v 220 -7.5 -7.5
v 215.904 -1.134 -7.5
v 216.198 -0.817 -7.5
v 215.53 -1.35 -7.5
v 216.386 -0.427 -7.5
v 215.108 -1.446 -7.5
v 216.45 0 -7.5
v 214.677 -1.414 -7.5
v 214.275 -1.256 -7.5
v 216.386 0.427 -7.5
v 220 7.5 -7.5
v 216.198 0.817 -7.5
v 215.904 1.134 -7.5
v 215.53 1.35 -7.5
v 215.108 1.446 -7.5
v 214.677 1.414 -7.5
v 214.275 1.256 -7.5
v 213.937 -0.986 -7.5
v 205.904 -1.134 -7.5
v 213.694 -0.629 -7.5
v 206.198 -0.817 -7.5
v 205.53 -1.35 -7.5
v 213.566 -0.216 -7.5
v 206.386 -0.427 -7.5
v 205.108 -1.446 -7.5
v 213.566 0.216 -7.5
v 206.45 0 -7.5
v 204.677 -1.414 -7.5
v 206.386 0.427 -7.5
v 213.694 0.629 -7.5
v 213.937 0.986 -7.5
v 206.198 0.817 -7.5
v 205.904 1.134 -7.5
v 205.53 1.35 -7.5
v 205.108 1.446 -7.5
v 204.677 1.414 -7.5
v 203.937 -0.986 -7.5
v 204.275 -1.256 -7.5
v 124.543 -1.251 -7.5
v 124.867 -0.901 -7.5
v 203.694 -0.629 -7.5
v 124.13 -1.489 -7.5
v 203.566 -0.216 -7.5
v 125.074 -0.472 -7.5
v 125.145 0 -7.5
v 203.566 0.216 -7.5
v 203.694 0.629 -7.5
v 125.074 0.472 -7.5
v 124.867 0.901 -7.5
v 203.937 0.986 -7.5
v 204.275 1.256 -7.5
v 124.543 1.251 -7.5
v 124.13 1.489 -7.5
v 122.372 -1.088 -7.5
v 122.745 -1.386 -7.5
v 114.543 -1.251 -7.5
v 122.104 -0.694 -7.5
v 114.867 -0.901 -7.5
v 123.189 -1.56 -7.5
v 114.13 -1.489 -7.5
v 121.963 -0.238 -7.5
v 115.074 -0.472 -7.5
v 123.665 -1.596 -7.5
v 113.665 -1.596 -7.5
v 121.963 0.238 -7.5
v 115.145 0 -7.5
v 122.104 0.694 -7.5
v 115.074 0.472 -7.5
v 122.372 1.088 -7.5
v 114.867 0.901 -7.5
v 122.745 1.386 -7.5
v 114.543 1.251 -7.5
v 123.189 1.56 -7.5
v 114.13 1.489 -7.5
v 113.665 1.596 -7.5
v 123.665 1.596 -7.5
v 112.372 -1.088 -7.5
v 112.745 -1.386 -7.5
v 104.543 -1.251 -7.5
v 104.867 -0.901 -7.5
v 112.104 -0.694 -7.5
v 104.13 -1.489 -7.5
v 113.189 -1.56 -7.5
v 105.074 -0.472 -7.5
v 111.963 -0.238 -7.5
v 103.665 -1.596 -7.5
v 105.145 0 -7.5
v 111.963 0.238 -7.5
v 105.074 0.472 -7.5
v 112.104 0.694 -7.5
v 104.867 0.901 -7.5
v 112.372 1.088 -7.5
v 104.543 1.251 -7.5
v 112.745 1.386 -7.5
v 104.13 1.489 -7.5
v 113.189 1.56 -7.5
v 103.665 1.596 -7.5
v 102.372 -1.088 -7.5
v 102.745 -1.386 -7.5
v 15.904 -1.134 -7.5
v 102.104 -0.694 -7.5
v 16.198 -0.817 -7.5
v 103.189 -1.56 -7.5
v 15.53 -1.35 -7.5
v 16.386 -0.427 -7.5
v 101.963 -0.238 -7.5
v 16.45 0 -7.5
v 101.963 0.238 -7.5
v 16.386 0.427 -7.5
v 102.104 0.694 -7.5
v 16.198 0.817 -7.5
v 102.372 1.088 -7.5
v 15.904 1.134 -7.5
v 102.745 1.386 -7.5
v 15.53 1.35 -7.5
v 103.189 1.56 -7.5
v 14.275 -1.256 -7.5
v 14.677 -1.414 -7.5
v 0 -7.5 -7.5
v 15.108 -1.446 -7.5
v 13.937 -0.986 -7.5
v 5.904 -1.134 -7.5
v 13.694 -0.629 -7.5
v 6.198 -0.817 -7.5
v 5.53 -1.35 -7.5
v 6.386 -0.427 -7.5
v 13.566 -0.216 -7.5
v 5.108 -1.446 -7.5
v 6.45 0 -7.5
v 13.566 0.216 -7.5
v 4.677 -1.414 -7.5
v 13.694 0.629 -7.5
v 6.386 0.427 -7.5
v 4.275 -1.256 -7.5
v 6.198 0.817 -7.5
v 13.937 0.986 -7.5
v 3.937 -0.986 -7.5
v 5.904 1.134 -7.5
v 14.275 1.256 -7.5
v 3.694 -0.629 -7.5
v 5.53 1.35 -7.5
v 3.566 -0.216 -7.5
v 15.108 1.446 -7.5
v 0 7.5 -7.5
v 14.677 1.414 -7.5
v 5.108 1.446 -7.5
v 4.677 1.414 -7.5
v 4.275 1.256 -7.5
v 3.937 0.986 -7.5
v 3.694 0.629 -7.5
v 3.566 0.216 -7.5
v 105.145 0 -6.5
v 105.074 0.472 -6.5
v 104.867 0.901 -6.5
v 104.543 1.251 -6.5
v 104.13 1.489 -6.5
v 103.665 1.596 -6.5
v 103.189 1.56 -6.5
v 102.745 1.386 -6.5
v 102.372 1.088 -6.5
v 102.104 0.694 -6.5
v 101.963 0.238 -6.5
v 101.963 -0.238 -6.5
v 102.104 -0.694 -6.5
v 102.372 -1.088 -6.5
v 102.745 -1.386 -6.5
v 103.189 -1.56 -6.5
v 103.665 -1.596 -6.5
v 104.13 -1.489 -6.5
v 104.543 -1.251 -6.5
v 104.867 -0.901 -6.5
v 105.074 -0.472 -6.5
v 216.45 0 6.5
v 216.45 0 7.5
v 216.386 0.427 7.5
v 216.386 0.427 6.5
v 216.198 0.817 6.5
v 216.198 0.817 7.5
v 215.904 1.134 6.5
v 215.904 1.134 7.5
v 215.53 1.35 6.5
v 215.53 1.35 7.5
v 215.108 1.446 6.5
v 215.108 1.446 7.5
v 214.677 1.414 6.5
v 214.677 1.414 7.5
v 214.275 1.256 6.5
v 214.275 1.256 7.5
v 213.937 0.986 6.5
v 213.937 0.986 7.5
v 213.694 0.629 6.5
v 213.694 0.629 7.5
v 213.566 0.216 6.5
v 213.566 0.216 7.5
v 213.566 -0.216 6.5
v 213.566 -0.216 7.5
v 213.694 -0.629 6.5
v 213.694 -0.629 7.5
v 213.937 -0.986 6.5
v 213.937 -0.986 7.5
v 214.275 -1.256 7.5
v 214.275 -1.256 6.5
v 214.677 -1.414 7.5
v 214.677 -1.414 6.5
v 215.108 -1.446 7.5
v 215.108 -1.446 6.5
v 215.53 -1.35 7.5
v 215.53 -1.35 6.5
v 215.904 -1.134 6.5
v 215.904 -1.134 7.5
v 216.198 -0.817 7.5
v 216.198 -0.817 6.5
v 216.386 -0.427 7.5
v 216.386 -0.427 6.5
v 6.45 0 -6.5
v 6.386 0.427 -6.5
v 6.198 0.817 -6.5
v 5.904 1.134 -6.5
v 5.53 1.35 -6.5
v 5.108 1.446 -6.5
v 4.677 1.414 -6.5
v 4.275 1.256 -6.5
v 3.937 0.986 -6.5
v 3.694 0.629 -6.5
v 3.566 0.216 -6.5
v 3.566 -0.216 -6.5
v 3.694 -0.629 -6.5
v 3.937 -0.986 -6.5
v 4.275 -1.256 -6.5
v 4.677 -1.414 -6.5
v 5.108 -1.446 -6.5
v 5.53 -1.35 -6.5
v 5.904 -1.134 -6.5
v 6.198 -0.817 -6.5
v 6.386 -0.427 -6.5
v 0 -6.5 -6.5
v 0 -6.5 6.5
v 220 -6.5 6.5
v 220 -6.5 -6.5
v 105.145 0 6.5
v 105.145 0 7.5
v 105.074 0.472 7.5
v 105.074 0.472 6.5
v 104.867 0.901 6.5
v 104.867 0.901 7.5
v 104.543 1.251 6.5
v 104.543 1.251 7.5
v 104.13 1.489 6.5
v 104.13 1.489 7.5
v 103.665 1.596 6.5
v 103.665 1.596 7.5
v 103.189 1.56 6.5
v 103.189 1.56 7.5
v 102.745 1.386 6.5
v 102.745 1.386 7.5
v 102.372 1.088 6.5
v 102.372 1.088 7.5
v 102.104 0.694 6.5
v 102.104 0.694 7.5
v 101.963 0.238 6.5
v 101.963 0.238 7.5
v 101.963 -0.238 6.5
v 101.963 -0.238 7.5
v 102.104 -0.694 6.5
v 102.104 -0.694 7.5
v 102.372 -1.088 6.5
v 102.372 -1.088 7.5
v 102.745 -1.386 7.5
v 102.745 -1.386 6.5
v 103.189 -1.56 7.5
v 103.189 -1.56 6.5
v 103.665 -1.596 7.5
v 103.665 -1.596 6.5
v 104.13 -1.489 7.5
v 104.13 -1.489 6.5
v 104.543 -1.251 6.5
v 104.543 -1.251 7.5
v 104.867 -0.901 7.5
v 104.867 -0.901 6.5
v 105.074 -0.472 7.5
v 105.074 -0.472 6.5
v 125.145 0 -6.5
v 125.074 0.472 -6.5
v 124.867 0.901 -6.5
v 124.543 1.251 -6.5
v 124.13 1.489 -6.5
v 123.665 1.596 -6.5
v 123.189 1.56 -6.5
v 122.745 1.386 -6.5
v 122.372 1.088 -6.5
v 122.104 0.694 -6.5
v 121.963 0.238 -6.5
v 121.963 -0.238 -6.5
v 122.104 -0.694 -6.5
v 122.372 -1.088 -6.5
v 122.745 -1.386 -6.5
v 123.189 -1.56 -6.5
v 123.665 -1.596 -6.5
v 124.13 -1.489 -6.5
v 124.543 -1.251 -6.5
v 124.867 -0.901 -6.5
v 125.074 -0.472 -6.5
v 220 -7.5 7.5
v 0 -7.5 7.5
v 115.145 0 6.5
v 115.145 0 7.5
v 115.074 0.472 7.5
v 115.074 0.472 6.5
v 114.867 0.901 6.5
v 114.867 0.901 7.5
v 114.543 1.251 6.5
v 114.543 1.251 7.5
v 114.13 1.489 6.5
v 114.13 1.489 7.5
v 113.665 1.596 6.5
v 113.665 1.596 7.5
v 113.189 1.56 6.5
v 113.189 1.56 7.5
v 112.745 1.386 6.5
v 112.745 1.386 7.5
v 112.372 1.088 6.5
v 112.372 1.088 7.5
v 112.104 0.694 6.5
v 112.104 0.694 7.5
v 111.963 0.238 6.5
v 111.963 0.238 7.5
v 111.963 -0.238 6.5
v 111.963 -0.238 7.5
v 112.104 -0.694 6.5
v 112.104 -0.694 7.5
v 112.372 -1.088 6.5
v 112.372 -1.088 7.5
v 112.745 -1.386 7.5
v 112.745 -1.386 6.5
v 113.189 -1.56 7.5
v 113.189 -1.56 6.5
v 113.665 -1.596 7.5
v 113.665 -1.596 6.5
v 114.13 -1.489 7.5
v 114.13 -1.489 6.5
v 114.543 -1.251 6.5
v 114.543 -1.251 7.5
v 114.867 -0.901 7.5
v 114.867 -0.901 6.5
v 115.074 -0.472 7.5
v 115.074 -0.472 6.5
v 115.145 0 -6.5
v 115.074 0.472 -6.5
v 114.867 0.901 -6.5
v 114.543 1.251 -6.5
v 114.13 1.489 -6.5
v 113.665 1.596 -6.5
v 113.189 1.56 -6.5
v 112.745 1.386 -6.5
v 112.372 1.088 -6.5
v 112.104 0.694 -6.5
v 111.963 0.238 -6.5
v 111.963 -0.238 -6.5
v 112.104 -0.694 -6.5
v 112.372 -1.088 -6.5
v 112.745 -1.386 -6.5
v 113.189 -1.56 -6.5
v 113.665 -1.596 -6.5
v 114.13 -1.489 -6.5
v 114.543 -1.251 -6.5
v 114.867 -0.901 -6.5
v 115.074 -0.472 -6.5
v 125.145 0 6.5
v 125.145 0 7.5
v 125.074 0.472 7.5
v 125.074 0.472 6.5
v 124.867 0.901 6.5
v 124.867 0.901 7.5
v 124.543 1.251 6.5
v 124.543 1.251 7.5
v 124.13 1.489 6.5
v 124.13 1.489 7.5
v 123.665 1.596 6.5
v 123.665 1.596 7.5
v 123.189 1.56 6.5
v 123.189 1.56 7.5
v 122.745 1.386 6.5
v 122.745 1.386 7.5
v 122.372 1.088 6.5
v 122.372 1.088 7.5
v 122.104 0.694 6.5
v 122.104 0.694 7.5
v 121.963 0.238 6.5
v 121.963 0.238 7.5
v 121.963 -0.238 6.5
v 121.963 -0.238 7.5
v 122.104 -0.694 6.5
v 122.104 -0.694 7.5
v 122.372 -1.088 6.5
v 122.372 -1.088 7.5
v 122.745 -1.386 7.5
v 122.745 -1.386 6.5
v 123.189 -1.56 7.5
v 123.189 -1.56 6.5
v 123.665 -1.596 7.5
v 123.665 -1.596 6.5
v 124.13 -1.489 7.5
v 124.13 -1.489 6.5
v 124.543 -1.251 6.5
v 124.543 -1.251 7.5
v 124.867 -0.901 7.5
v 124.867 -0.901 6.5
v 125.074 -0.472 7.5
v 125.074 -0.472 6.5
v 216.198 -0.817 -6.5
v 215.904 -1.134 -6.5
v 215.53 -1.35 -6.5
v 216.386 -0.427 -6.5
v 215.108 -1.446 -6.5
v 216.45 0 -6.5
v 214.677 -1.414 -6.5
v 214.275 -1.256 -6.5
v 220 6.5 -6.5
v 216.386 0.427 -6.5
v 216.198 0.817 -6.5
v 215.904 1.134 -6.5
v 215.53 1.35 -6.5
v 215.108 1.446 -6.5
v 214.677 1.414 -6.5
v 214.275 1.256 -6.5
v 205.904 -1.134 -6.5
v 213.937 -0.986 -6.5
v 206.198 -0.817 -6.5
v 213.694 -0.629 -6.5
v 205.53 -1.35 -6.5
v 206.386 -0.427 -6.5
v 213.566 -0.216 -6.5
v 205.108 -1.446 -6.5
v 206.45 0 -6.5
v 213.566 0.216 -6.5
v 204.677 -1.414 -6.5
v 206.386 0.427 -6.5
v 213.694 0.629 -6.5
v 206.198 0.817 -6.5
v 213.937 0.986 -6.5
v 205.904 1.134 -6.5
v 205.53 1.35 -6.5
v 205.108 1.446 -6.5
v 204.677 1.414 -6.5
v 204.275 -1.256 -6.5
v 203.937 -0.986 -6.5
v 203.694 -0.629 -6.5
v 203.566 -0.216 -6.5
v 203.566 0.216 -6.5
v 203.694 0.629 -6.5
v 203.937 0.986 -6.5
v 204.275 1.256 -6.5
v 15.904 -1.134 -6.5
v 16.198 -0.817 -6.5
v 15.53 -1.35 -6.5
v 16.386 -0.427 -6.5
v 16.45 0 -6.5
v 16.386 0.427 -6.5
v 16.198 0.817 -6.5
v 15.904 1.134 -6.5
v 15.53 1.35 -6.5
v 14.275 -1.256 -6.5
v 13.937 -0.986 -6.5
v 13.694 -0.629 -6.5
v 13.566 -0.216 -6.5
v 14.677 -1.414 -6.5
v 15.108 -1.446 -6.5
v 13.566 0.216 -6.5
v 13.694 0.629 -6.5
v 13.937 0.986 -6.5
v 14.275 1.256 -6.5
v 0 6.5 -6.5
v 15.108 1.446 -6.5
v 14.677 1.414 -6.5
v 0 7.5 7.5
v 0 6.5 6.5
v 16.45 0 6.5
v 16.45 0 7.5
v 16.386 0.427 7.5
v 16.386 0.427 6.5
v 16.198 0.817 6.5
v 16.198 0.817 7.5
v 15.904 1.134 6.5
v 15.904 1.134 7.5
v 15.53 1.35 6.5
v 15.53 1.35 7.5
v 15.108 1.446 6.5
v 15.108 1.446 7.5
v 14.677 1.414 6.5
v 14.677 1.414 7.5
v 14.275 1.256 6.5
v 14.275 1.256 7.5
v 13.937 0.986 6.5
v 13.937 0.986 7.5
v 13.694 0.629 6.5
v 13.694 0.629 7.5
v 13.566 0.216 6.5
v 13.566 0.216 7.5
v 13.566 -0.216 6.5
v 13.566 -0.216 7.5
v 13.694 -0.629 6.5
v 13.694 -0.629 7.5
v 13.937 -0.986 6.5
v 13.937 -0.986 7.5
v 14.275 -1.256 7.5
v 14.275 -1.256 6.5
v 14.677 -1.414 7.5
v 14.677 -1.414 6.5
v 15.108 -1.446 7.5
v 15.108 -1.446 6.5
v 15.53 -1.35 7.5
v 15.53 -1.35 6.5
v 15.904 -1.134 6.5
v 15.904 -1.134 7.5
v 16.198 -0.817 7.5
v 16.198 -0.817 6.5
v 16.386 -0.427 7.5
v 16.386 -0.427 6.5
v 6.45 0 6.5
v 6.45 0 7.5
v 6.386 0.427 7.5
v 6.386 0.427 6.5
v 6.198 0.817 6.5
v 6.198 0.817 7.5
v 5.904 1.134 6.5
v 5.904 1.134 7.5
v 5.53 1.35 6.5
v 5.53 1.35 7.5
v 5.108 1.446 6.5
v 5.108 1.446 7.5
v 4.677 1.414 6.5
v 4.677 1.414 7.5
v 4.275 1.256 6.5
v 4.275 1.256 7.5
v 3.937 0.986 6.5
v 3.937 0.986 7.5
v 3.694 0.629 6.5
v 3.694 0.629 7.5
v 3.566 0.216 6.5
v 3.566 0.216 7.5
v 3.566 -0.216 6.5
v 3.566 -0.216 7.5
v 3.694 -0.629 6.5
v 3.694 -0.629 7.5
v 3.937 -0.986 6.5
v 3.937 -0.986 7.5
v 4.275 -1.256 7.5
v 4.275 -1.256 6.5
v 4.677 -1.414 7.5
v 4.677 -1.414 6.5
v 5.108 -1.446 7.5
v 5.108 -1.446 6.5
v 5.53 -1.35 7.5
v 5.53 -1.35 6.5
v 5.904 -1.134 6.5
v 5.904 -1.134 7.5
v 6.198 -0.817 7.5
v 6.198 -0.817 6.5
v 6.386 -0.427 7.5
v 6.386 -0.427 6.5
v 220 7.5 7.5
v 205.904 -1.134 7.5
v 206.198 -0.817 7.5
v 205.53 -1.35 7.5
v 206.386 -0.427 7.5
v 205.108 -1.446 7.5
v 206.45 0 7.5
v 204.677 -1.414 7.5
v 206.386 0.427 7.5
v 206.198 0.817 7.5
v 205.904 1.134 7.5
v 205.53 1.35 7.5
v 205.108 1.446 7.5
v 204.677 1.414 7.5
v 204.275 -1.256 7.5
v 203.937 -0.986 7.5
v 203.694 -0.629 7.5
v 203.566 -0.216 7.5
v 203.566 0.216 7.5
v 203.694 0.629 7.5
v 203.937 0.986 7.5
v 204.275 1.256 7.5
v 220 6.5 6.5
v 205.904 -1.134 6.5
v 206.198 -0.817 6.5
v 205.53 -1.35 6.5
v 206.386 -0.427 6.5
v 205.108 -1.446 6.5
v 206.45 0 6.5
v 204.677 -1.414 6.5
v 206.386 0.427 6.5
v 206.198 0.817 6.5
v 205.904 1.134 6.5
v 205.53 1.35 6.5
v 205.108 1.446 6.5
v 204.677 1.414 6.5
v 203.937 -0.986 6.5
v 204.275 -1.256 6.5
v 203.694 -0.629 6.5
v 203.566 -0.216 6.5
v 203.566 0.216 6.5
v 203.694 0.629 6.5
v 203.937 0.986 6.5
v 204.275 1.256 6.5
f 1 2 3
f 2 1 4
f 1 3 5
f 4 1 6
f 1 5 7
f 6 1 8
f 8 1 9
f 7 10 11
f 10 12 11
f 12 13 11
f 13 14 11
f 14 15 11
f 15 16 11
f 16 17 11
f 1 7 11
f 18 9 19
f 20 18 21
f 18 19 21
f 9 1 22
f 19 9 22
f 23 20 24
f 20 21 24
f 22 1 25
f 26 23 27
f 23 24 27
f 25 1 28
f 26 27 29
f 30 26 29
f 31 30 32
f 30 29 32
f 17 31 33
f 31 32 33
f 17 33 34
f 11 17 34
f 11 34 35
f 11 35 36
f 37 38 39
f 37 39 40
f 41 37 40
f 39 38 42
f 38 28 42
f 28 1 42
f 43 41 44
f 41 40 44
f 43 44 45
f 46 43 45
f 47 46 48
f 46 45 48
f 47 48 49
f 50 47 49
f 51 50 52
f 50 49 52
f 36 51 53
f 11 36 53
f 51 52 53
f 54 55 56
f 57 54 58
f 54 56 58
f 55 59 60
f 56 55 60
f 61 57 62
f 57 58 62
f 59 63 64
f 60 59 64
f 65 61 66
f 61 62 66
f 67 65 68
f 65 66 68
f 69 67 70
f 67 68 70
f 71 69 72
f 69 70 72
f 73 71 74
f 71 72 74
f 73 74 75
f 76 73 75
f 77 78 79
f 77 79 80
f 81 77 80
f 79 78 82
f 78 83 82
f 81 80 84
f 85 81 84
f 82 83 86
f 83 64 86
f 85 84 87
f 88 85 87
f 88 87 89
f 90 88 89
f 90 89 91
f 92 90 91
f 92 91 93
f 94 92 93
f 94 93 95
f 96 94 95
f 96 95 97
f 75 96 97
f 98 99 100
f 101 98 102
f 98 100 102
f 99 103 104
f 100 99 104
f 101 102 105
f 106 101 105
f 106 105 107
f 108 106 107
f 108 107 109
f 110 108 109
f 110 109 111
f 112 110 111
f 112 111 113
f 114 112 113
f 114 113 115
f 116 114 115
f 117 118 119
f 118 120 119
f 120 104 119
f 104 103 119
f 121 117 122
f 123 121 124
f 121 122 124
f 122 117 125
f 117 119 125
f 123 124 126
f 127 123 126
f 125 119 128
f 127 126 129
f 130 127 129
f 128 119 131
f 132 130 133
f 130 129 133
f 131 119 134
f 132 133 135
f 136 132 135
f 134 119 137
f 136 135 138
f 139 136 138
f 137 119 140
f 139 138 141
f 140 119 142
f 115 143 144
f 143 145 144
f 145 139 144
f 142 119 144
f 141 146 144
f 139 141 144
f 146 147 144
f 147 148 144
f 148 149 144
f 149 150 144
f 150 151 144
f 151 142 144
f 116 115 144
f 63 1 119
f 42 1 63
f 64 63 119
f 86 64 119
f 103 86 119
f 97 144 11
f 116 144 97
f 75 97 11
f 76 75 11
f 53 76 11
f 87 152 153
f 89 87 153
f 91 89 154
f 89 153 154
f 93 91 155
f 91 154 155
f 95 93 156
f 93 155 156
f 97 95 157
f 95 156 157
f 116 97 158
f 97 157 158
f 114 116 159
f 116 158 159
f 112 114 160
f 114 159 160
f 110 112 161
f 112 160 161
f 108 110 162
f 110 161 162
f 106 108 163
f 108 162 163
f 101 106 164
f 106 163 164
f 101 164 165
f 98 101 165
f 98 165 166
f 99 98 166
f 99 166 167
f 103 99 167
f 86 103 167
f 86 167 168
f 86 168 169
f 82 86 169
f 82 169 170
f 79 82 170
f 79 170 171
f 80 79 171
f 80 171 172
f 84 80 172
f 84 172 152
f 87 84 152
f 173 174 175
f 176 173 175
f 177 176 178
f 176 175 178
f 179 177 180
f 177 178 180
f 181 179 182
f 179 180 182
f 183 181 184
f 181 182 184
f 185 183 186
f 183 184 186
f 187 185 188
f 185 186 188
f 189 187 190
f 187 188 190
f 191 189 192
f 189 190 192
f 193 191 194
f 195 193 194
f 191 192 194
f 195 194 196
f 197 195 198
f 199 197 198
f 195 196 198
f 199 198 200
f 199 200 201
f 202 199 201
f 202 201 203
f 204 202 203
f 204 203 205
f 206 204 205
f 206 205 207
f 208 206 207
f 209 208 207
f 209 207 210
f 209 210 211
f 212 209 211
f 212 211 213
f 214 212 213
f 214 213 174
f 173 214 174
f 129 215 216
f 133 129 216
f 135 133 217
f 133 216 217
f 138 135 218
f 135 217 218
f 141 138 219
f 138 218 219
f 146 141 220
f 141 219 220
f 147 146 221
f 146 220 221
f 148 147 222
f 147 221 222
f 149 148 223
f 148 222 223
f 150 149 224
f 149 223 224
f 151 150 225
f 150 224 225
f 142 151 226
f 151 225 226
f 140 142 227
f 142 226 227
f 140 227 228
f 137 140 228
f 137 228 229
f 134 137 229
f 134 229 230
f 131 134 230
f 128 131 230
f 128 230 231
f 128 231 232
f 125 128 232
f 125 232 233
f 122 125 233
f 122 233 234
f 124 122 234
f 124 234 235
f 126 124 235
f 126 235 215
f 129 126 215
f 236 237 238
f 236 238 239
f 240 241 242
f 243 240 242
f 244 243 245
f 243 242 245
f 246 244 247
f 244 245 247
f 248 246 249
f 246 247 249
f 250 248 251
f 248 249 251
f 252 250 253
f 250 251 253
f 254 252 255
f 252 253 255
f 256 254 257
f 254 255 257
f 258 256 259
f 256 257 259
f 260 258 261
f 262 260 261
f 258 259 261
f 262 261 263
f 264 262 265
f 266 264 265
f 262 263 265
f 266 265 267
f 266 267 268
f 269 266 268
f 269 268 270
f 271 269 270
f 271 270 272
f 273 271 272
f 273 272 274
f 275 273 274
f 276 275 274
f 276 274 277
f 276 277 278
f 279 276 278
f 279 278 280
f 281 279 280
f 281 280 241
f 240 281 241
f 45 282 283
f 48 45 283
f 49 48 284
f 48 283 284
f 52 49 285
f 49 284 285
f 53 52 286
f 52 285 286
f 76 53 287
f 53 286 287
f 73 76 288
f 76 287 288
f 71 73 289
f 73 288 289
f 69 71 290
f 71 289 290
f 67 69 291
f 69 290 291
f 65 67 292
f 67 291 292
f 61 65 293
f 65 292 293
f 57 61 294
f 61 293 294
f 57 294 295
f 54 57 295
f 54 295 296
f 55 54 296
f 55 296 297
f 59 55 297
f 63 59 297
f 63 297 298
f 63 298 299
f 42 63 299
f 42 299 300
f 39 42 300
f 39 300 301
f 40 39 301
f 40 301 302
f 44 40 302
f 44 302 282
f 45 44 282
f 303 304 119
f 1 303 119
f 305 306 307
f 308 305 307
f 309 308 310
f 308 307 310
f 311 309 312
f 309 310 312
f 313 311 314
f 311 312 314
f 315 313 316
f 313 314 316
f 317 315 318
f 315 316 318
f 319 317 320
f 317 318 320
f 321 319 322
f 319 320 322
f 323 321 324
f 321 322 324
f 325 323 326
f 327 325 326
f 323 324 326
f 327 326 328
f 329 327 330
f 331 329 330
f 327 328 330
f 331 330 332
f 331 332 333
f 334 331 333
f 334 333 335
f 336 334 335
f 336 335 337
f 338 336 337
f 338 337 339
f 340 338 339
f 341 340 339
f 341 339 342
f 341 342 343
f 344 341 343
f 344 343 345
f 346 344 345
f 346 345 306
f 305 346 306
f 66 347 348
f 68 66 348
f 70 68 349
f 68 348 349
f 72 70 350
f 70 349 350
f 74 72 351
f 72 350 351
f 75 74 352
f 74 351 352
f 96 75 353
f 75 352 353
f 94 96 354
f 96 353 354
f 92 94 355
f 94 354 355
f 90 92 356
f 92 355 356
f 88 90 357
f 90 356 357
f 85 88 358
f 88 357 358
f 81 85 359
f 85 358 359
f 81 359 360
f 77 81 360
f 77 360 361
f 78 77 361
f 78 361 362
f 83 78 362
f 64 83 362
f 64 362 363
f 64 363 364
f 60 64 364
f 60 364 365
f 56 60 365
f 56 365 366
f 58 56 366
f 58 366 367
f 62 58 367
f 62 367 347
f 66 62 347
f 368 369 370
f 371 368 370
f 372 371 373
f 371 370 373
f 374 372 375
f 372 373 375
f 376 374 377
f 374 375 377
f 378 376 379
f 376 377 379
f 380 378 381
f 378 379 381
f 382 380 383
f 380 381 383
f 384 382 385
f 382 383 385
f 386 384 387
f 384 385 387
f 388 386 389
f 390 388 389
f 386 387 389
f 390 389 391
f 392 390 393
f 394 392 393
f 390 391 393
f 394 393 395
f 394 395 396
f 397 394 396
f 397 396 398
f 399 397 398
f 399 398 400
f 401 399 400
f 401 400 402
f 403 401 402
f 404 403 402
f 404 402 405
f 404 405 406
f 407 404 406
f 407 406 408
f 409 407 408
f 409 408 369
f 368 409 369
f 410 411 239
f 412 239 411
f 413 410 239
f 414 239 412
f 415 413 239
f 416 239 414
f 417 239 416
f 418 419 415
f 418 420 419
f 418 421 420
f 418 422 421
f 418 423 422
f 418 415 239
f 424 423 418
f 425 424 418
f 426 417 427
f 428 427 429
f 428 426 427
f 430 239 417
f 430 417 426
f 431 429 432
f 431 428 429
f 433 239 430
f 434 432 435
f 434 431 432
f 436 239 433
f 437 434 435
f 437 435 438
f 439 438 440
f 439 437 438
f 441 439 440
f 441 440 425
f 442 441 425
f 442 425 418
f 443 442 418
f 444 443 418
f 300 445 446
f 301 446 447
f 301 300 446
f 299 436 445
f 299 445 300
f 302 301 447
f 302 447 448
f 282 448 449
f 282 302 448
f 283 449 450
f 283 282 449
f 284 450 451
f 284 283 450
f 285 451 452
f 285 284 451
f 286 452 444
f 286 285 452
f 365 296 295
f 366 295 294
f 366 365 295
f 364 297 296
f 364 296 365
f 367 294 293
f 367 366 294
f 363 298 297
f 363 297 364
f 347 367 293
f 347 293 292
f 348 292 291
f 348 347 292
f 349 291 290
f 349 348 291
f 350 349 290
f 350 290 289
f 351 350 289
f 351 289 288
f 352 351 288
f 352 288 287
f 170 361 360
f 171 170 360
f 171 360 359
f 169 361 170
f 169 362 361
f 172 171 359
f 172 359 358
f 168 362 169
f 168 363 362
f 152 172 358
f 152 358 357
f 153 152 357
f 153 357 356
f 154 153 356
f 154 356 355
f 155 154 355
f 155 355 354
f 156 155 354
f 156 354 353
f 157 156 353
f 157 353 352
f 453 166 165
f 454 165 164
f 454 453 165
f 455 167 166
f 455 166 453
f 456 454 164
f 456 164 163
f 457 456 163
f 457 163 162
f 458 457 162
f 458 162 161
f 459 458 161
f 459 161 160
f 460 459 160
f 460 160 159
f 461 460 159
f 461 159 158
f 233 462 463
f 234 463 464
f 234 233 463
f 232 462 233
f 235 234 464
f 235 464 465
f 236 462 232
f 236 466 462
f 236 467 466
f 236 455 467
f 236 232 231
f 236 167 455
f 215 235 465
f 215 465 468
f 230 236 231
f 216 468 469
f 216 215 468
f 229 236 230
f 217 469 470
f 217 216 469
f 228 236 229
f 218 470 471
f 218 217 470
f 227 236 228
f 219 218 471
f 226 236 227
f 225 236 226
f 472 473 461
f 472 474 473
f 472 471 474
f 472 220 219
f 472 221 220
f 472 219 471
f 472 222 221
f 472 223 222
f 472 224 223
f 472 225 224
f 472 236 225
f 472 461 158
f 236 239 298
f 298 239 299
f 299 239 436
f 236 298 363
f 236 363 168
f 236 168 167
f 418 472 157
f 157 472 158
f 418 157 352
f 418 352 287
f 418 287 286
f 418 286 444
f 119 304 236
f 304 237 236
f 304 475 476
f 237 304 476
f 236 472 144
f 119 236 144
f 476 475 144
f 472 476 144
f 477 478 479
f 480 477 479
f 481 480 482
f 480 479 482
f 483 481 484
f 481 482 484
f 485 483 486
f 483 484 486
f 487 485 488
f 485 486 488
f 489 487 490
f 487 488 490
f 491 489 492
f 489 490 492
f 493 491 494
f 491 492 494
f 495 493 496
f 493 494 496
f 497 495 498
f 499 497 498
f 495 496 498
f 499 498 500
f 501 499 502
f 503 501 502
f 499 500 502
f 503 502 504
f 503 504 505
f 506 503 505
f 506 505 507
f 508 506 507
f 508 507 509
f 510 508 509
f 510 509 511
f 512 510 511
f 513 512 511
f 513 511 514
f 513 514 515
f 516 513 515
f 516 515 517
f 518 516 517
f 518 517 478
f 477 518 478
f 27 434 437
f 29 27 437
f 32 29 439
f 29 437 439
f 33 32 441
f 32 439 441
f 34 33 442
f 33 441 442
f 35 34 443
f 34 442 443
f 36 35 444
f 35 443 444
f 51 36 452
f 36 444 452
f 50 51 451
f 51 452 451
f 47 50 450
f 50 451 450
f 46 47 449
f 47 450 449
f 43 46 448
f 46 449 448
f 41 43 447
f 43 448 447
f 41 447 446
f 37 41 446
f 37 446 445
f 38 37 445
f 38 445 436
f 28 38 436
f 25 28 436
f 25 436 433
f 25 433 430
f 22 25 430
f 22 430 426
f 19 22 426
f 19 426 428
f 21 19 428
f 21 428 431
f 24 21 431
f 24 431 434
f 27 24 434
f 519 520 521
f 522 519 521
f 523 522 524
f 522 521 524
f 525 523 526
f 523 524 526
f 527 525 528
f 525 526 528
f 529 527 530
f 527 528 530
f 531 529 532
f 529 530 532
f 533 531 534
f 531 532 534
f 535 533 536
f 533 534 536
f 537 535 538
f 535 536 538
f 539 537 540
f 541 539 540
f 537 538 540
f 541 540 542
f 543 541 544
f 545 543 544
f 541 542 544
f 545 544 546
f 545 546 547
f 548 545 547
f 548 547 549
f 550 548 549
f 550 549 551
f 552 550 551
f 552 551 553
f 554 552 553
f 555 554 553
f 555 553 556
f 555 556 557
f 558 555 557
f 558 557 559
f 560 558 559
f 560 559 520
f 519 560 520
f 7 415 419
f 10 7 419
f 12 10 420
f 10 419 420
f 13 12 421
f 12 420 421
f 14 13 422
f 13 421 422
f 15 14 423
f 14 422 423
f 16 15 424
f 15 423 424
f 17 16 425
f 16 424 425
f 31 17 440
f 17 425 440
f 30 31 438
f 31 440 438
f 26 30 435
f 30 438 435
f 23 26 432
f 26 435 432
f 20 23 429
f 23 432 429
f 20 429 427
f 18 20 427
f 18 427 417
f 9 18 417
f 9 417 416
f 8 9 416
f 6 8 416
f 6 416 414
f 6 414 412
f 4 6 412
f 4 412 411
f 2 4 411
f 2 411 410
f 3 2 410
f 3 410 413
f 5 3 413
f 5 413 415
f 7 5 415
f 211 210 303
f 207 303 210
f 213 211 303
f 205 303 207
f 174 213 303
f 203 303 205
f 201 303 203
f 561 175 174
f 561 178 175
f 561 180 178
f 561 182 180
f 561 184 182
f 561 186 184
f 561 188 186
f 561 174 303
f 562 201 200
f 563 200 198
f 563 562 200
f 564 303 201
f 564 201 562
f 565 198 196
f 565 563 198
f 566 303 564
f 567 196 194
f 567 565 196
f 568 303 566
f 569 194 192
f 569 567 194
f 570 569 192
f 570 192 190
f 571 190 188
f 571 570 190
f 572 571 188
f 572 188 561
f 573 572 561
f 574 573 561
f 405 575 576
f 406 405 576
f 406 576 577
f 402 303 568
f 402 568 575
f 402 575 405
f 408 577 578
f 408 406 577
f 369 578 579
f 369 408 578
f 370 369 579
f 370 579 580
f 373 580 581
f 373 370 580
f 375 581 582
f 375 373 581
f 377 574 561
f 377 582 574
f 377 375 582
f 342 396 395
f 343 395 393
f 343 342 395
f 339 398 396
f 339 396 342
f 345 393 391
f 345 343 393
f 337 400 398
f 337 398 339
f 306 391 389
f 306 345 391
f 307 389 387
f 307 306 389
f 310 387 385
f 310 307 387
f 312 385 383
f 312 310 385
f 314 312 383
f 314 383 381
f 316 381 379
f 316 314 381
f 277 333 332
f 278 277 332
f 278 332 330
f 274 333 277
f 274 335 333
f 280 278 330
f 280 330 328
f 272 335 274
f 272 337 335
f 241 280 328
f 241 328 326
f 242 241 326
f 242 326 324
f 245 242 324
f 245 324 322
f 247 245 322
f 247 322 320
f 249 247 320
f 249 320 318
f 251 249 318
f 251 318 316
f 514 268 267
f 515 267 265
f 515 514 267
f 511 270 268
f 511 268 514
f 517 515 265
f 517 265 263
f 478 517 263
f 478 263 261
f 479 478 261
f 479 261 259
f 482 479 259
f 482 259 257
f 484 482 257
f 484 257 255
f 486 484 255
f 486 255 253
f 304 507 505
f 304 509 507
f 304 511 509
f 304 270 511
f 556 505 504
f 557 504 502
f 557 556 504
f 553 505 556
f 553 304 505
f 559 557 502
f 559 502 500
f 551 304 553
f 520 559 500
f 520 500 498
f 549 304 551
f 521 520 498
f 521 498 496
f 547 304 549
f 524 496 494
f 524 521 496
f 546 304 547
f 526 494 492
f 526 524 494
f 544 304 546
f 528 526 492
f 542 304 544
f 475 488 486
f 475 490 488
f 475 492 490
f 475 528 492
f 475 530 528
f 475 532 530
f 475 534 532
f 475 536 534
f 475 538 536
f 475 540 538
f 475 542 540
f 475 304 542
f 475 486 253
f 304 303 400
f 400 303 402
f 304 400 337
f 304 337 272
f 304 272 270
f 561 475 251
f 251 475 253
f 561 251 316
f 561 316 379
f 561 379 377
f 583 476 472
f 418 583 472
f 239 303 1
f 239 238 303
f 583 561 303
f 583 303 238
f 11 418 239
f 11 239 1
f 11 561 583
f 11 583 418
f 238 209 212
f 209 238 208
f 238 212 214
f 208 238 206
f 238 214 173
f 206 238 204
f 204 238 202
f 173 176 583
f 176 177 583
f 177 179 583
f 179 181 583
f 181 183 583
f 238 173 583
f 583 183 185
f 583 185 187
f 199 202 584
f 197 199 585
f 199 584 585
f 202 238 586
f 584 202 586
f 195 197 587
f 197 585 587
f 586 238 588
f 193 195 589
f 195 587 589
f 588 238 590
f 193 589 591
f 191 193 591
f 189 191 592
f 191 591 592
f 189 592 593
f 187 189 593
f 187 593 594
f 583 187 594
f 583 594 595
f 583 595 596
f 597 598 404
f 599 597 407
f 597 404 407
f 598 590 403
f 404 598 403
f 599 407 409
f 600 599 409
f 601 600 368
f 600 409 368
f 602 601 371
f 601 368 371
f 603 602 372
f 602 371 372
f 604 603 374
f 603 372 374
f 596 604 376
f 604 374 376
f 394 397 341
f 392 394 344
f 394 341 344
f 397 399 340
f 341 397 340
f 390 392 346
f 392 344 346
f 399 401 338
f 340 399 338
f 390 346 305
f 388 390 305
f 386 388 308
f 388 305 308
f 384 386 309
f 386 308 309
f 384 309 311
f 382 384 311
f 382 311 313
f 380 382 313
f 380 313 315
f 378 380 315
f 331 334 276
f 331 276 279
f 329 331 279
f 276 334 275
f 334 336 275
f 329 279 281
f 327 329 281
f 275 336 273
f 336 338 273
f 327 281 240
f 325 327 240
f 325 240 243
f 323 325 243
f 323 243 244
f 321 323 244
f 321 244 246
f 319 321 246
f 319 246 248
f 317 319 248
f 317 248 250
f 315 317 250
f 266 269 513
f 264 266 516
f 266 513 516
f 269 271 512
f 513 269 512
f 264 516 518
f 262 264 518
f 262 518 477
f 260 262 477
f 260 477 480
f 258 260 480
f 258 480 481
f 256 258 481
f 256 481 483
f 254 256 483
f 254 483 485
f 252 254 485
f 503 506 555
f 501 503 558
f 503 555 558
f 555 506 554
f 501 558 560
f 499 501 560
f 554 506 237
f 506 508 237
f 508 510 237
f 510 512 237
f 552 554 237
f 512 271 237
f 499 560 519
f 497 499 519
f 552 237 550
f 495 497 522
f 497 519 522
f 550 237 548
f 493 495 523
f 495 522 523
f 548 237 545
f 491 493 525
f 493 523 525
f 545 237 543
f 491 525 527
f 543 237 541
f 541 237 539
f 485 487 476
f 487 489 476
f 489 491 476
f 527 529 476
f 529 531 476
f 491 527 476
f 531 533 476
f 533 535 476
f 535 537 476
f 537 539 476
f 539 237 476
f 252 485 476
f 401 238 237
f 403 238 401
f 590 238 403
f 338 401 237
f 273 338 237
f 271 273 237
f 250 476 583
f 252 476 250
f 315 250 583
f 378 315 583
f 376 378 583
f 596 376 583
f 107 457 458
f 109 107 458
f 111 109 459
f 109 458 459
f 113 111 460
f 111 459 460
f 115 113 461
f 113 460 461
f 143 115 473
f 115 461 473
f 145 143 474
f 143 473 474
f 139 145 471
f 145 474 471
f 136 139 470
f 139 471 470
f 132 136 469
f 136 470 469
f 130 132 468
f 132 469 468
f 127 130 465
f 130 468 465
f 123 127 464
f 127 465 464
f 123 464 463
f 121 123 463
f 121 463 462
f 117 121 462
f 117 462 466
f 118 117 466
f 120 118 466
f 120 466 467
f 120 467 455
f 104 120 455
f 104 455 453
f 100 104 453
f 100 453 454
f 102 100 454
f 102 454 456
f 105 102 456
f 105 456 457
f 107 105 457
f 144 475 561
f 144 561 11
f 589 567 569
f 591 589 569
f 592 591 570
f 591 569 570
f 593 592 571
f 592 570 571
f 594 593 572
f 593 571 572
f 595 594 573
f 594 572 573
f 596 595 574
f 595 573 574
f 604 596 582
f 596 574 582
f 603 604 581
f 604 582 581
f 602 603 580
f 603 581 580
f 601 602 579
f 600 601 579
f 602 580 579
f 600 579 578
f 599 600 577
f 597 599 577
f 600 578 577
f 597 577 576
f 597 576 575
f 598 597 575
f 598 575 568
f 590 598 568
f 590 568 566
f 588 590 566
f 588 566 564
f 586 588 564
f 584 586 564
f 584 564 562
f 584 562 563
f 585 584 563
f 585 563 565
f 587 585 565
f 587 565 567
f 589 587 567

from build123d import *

# Parameters (mm, degrees)
SKETCH_1_W          = 15
SKETCH_1_H          = 15
SKETCH_1_W_2        = 13
SKETCH_1_H_2        = 13
EXTRUDE_1_DEPTH     = 220
SKETCH_2_R          = 1.45
SKETCH_2_R_2        = 1.6
CUT_EXTRUDE_1_DEPTH = 221.638278637


with BuildPart() as part:
    # 草图1 → 凸台-拉伸1 (new body)
    with BuildSketch(Plane(origin=(0, 0, 0), x_dir=(0, 0, -1), z_dir=(1, 0, 0))):
        Rectangle(SKETCH_1_W, SKETCH_1_H)
        Rectangle(SKETCH_1_W_2, SKETCH_1_H_2, mode=Mode.SUBTRACT)
    extrude(amount=EXTRUDE_1_DEPTH)

    # 草图2 → 切除-拉伸1 (cut, through all)
    with BuildSketch(Plane.XY.offset(7.5)):
        with Locations((215, 0)):
            Circle(SKETCH_2_R)
        with Locations((205, 0)):
            Circle(SKETCH_2_R)
        with Locations((123.545188216, 0)):
            Circle(SKETCH_2_R_2)
        with Locations((113.545188216, 0)):
            Circle(SKETCH_2_R_2)
        with Locations((103.545188216, 0)):
            Circle(SKETCH_2_R_2)
        with Locations((15, 0)):
            Circle(SKETCH_2_R)
        with Locations((5, 0)):
            Circle(SKETCH_2_R)
    extrude(amount=-CUT_EXTRUDE_1_DEPTH, mode=Mode.SUBTRACT)


solid = part.part
